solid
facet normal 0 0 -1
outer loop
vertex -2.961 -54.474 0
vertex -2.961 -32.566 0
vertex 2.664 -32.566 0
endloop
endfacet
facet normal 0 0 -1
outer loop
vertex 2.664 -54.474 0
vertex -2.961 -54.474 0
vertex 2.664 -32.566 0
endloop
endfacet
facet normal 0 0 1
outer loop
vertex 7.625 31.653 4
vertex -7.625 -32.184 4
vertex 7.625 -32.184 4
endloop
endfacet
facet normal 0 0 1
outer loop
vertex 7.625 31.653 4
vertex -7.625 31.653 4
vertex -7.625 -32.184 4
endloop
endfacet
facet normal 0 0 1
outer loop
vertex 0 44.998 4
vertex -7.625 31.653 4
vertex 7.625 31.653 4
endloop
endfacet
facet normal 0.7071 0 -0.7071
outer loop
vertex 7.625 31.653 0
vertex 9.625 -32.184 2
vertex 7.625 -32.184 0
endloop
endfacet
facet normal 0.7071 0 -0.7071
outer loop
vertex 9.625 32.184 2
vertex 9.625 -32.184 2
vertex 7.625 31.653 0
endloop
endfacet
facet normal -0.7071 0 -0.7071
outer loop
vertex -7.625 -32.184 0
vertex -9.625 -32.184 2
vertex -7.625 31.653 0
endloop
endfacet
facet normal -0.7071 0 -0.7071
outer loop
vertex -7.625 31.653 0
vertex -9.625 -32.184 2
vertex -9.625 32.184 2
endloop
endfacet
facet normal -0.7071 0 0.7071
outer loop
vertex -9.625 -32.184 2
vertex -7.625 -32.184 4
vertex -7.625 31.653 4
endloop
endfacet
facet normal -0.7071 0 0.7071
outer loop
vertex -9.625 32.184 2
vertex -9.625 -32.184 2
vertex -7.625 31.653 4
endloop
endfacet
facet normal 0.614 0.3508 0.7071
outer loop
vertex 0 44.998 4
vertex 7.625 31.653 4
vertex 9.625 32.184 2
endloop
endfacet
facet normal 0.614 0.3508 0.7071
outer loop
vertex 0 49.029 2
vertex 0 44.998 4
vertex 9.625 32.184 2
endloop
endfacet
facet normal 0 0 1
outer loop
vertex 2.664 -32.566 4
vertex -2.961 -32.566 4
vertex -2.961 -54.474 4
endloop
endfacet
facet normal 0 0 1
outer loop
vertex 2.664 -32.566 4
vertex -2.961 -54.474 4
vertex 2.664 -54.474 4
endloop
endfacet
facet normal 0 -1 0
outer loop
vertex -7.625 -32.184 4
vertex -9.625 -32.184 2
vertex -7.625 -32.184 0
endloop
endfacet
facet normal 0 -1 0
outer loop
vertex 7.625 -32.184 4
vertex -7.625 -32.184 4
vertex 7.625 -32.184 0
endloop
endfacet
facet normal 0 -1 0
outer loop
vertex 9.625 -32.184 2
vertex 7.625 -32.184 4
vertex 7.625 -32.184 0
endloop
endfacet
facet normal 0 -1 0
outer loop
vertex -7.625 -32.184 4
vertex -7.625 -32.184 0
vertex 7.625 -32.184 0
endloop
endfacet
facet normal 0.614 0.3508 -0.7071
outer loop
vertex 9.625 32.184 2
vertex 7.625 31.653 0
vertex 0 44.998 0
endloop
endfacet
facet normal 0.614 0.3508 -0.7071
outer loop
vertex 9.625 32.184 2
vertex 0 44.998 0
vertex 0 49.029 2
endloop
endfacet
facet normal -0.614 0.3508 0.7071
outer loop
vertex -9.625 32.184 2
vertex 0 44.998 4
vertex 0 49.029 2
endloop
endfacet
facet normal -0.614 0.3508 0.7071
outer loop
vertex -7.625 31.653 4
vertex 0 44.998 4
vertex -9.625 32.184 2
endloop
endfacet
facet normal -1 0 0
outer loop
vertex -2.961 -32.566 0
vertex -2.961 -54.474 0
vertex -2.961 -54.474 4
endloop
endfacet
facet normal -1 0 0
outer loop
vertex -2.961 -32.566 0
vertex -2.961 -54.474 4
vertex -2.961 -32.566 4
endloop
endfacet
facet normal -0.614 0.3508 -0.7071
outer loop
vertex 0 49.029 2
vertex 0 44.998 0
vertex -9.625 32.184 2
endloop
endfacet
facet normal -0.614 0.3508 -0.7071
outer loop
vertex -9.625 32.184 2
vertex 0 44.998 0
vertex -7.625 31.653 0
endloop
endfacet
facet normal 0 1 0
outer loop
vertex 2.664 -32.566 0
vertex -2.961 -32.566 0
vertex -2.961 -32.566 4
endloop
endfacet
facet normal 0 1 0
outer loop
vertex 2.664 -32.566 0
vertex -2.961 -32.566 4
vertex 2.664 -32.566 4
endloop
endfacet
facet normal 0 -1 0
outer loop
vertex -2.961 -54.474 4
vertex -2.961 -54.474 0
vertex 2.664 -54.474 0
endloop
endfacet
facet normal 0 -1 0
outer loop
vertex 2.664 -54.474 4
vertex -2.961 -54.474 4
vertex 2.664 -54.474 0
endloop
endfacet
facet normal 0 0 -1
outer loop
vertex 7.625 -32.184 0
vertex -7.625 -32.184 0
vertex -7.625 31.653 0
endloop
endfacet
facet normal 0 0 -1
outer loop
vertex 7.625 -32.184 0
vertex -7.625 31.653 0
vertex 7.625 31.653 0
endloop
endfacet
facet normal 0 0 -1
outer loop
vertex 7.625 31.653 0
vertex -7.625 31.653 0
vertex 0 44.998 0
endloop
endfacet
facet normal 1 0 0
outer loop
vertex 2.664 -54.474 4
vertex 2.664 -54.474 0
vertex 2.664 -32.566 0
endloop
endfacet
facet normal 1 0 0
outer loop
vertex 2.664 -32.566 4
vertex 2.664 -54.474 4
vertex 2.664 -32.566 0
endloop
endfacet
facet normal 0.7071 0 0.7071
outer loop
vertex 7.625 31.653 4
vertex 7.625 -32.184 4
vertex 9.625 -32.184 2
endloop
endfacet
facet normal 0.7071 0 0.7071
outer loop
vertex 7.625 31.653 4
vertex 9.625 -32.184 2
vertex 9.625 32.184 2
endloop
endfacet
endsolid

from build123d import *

# Parameters (mm, degrees)
F0_W     = 19.2505270243
F0_H     = 64.3689483404
F1_DEPTH = 4
F2_SIZE  = 2
F3_SIZE  = 1.99999
F4_W     = 5.6250048801
F4_H     = 21.9078958035
F5_DEPTH = 4


# Not quite as in the source:
# - a fillet or chamfer is up to 0.001 mm smaller than in the source, because OpenCascade refuses the exact size


with BuildPart() as f1:
    # F0 (on Top) → F1 (new body)
    with BuildSketch(Plane.XY):
        Polygon((0, 49.0286834538), (-9.6252635121, 32.1844741702), (9.6252635121, 32.1844741702), align=None)
        Rectangle(F0_W, F0_H)
    extrude(amount=F1_DEPTH)

    # F2
    f2_edges = [f1.edges().sort_by_distance(p)[0] for p in [
        (9.625264, 0, 4),
        (4.812632, 40.606579, 4),
        (-4.812632, 40.606579, 4),
        (-9.625264, 0, 4),
    ]]
    chamfer(f2_edges, length=F2_SIZE)

    # F3 (size 2 in the source; OpenCascade refuses exactly that, so slightly less here)
    f3_edges = [f1.edges().sort_by_distance(p)[0] for p in [
        (4.812632, 40.606579, 0),
        (-4.812632, 40.606579, 0),
        (-9.625264, 0, 0),
        (9.625264, 0, 0),
    ]]
    chamfer(f3_edges, length=F3_SIZE)


with BuildPart() as f5:
    # F4 (on Top) → F5 (new body)
    with BuildSketch(Plane.XY):
        with Locations((-0.1480260398, -43.5197390616)):
            Rectangle(F4_W, F4_H)
    extrude(amount=F5_DEPTH)


solid = Compound([f1.part, f5.part])
